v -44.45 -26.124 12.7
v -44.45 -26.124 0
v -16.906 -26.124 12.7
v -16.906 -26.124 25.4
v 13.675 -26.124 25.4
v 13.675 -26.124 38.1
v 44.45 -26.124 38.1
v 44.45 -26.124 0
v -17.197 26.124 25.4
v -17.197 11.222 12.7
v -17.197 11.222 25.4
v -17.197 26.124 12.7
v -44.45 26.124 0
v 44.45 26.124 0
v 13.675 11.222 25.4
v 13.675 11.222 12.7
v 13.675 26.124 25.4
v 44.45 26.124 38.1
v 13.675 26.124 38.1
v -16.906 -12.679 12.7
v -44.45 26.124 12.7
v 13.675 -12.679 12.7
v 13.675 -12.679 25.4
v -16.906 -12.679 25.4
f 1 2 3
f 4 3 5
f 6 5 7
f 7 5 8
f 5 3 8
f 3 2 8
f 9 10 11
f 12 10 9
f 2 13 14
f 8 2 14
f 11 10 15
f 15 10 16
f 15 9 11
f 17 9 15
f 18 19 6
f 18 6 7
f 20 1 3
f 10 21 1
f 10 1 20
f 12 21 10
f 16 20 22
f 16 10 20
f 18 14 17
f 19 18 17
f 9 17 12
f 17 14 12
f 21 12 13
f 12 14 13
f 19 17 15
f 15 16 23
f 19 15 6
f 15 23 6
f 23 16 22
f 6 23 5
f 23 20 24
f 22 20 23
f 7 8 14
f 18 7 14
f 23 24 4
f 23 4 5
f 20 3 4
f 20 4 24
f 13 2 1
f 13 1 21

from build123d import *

# Parameters (mm, degrees)
F0_W     = 88.9
F0_H     = 52.248245614
F1_DEPTH = 12.7
F2_W     = 30.8722835034
F2_H     = 14.9023200136
F2_W_2   = 30.5808074772
F2_H_2   = 13.4449426767
F3_DEPTH = 12.7
F4_DEPTH = 25.4


with BuildPart() as f1:
    # F0 (on Top) → F1 (new body)
    with BuildSketch(Plane.XY):
        Rectangle(F0_W, F0_H)
    extrude(amount=F1_DEPTH)

    # F2 (on face) → F3 (join)
    with BuildSketch(Plane.XY.offset(12.7)):
        with Locations((-1.7609084025, 18.6729628002)):
            Rectangle(F2_W, F2_H)
        with Locations((-1.6151703894, -19.4016514687)):
            Rectangle(F2_W_2, F2_H_2)
    extrude(amount=F3_DEPTH)

    # F2 (on face) → F4 (join)
    with BuildSketch(Plane.XY.offset(12.7)):
        Polygon((44.45, 26.124122807), (13.6752333492, 26.124122807), (13.6752333492, 11.2218027934), (13.6752333492, -12.6791801304), (13.6752333492, -26.124122807), (44.45, -26.124122807), (44.45, -12.6791801304), (44.45, 11.2218027934), align=None)
    extrude(amount=F4_DEPTH)


solid = f1.part
